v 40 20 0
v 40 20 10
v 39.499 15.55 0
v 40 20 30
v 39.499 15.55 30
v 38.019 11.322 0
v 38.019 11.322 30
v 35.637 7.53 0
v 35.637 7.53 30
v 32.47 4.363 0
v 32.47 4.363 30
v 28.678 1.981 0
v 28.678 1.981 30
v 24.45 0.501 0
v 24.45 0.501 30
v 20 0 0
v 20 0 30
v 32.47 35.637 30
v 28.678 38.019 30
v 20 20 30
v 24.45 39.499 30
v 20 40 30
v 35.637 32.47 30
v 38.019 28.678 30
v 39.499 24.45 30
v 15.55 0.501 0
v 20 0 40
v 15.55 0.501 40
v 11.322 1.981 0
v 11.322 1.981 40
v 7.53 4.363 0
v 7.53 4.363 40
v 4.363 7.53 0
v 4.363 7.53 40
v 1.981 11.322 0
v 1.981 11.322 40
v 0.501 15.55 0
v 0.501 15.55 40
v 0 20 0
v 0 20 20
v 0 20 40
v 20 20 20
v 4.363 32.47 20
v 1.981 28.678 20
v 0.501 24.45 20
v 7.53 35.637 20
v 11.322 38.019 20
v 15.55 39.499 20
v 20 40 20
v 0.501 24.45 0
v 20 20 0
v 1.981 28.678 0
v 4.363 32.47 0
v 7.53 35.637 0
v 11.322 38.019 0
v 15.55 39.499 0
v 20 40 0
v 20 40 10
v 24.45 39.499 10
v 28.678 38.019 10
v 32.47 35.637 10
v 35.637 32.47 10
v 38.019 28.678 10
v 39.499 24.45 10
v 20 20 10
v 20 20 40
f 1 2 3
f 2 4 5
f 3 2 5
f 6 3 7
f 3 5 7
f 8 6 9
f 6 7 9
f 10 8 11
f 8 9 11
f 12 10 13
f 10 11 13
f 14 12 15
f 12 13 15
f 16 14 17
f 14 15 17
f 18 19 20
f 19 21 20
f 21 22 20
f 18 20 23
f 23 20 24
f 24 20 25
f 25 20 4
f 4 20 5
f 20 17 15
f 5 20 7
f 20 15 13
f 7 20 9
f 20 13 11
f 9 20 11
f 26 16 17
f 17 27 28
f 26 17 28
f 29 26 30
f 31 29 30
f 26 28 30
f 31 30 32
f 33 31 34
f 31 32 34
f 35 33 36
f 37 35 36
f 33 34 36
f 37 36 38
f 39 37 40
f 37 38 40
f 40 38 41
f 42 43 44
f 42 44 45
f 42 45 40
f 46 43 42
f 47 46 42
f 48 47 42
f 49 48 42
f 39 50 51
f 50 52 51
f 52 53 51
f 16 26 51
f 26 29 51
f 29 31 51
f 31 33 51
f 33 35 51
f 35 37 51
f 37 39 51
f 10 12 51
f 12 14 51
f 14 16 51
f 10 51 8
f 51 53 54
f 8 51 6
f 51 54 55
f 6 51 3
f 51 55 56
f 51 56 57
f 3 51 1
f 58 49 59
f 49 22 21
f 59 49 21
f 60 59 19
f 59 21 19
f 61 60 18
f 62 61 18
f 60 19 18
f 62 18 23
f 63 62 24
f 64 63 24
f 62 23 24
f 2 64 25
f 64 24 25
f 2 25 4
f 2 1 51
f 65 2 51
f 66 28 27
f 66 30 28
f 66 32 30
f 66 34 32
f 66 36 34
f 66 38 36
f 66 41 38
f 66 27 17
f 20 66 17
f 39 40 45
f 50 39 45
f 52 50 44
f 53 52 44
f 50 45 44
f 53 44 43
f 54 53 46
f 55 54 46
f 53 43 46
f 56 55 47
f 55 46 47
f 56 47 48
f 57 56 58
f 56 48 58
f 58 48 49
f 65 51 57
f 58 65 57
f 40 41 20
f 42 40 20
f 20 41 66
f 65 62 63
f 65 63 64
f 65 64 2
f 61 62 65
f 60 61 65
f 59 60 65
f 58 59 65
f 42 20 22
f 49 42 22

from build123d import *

# Parameters (mm, degrees)
SKETCH1_W           = 40
SKETCH1_H           = 40
BOSS_EXTRUDE1_DEPTH = 40
CUT_EXTRUDE1_DEPTH  = 40
SKETCH3_W           = 20
SKETCH3_H           = 10
CUT_EXTRUDE2_DEPTH  = 40
CUT_EXTRUDE3_DEPTH  = 20
CUT_EXTRUDE4_DEPTH  = 10


with BuildPart() as part:
    # Sketch1 → Boss-Extrude1 (new body)
    with BuildSketch(Plane.XY):
        with Locations((20, 20)):
            Rectangle(SKETCH1_W, SKETCH1_H)
    extrude(amount=BOSS_EXTRUDE1_DEPTH)

    # Sketch2 → Cut-Extrude1 (cut)
    with BuildSketch(Plane.XY.offset(40)):
        with BuildLine():
            Line((20, 40), (0, 40))
            Line((0, 40), (0, 20))
            ThreePointArc((0, 20), (5.857864376, 34.142135624), (20, 40))
        make_face()
        with BuildLine():
            ThreePointArc((20, 0), (5.857864376, 5.857864376), (0, 20))
            Line((0, 20), (0, 0))
            Line((0, 0), (20, 0))
        make_face()
        with BuildLine():
            Line((40, 0), (40, 20))
            ThreePointArc((40, 20), (34.142135624, 5.857864376), (20, 0))
            Line((20, 0), (40, 0))
        make_face()
        with BuildLine():
            Line((40, 40), (20, 40))
            ThreePointArc((20, 40), (34.142135624, 34.142135624), (40, 20))
            Line((40, 20), (40, 40))
        make_face()
    extrude(amount=-CUT_EXTRUDE1_DEPTH, mode=Mode.SUBTRACT)

    # Sketch3 → Cut-Extrude2 (cut)
    with BuildSketch(Plane(origin=(0, 0, 0), x_dir=(1, 0, 0), z_dir=(0, 1, 0))):
        with Locations((30, -35)):
            Rectangle(SKETCH3_W, SKETCH3_H)
    extrude(amount=CUT_EXTRUDE2_DEPTH, mode=Mode.SUBTRACT)

    # Sketch4 → Cut-Extrude3 (cut)
    with BuildSketch(Plane.XY.offset(40)):
        with BuildLine():
            Line((0, 20), (20, 20))
            Line((20, 20), (20, 40))
            ThreePointArc((20, 40), (5.857864376, 34.142135624), (0, 20))
        make_face()
    extrude(amount=-CUT_EXTRUDE3_DEPTH, mode=Mode.SUBTRACT)

    # Sketch5 → Cut-Extrude4 (cut)
    with BuildSketch(Plane(origin=(0, 0, 0), x_dir=(-1, 0, 0), z_dir=(0, 0, -1))):
        with BuildLine():
            Line((-40, 20), (-20, 20))
            Line((-20, 20), (-20, 40))
            ThreePointArc((-20, 40), (-34.142135624, 34.142135624), (-40, 20))
        make_face()
    extrude(amount=-CUT_EXTRUDE4_DEPTH, mode=Mode.SUBTRACT)


solid = part.part
